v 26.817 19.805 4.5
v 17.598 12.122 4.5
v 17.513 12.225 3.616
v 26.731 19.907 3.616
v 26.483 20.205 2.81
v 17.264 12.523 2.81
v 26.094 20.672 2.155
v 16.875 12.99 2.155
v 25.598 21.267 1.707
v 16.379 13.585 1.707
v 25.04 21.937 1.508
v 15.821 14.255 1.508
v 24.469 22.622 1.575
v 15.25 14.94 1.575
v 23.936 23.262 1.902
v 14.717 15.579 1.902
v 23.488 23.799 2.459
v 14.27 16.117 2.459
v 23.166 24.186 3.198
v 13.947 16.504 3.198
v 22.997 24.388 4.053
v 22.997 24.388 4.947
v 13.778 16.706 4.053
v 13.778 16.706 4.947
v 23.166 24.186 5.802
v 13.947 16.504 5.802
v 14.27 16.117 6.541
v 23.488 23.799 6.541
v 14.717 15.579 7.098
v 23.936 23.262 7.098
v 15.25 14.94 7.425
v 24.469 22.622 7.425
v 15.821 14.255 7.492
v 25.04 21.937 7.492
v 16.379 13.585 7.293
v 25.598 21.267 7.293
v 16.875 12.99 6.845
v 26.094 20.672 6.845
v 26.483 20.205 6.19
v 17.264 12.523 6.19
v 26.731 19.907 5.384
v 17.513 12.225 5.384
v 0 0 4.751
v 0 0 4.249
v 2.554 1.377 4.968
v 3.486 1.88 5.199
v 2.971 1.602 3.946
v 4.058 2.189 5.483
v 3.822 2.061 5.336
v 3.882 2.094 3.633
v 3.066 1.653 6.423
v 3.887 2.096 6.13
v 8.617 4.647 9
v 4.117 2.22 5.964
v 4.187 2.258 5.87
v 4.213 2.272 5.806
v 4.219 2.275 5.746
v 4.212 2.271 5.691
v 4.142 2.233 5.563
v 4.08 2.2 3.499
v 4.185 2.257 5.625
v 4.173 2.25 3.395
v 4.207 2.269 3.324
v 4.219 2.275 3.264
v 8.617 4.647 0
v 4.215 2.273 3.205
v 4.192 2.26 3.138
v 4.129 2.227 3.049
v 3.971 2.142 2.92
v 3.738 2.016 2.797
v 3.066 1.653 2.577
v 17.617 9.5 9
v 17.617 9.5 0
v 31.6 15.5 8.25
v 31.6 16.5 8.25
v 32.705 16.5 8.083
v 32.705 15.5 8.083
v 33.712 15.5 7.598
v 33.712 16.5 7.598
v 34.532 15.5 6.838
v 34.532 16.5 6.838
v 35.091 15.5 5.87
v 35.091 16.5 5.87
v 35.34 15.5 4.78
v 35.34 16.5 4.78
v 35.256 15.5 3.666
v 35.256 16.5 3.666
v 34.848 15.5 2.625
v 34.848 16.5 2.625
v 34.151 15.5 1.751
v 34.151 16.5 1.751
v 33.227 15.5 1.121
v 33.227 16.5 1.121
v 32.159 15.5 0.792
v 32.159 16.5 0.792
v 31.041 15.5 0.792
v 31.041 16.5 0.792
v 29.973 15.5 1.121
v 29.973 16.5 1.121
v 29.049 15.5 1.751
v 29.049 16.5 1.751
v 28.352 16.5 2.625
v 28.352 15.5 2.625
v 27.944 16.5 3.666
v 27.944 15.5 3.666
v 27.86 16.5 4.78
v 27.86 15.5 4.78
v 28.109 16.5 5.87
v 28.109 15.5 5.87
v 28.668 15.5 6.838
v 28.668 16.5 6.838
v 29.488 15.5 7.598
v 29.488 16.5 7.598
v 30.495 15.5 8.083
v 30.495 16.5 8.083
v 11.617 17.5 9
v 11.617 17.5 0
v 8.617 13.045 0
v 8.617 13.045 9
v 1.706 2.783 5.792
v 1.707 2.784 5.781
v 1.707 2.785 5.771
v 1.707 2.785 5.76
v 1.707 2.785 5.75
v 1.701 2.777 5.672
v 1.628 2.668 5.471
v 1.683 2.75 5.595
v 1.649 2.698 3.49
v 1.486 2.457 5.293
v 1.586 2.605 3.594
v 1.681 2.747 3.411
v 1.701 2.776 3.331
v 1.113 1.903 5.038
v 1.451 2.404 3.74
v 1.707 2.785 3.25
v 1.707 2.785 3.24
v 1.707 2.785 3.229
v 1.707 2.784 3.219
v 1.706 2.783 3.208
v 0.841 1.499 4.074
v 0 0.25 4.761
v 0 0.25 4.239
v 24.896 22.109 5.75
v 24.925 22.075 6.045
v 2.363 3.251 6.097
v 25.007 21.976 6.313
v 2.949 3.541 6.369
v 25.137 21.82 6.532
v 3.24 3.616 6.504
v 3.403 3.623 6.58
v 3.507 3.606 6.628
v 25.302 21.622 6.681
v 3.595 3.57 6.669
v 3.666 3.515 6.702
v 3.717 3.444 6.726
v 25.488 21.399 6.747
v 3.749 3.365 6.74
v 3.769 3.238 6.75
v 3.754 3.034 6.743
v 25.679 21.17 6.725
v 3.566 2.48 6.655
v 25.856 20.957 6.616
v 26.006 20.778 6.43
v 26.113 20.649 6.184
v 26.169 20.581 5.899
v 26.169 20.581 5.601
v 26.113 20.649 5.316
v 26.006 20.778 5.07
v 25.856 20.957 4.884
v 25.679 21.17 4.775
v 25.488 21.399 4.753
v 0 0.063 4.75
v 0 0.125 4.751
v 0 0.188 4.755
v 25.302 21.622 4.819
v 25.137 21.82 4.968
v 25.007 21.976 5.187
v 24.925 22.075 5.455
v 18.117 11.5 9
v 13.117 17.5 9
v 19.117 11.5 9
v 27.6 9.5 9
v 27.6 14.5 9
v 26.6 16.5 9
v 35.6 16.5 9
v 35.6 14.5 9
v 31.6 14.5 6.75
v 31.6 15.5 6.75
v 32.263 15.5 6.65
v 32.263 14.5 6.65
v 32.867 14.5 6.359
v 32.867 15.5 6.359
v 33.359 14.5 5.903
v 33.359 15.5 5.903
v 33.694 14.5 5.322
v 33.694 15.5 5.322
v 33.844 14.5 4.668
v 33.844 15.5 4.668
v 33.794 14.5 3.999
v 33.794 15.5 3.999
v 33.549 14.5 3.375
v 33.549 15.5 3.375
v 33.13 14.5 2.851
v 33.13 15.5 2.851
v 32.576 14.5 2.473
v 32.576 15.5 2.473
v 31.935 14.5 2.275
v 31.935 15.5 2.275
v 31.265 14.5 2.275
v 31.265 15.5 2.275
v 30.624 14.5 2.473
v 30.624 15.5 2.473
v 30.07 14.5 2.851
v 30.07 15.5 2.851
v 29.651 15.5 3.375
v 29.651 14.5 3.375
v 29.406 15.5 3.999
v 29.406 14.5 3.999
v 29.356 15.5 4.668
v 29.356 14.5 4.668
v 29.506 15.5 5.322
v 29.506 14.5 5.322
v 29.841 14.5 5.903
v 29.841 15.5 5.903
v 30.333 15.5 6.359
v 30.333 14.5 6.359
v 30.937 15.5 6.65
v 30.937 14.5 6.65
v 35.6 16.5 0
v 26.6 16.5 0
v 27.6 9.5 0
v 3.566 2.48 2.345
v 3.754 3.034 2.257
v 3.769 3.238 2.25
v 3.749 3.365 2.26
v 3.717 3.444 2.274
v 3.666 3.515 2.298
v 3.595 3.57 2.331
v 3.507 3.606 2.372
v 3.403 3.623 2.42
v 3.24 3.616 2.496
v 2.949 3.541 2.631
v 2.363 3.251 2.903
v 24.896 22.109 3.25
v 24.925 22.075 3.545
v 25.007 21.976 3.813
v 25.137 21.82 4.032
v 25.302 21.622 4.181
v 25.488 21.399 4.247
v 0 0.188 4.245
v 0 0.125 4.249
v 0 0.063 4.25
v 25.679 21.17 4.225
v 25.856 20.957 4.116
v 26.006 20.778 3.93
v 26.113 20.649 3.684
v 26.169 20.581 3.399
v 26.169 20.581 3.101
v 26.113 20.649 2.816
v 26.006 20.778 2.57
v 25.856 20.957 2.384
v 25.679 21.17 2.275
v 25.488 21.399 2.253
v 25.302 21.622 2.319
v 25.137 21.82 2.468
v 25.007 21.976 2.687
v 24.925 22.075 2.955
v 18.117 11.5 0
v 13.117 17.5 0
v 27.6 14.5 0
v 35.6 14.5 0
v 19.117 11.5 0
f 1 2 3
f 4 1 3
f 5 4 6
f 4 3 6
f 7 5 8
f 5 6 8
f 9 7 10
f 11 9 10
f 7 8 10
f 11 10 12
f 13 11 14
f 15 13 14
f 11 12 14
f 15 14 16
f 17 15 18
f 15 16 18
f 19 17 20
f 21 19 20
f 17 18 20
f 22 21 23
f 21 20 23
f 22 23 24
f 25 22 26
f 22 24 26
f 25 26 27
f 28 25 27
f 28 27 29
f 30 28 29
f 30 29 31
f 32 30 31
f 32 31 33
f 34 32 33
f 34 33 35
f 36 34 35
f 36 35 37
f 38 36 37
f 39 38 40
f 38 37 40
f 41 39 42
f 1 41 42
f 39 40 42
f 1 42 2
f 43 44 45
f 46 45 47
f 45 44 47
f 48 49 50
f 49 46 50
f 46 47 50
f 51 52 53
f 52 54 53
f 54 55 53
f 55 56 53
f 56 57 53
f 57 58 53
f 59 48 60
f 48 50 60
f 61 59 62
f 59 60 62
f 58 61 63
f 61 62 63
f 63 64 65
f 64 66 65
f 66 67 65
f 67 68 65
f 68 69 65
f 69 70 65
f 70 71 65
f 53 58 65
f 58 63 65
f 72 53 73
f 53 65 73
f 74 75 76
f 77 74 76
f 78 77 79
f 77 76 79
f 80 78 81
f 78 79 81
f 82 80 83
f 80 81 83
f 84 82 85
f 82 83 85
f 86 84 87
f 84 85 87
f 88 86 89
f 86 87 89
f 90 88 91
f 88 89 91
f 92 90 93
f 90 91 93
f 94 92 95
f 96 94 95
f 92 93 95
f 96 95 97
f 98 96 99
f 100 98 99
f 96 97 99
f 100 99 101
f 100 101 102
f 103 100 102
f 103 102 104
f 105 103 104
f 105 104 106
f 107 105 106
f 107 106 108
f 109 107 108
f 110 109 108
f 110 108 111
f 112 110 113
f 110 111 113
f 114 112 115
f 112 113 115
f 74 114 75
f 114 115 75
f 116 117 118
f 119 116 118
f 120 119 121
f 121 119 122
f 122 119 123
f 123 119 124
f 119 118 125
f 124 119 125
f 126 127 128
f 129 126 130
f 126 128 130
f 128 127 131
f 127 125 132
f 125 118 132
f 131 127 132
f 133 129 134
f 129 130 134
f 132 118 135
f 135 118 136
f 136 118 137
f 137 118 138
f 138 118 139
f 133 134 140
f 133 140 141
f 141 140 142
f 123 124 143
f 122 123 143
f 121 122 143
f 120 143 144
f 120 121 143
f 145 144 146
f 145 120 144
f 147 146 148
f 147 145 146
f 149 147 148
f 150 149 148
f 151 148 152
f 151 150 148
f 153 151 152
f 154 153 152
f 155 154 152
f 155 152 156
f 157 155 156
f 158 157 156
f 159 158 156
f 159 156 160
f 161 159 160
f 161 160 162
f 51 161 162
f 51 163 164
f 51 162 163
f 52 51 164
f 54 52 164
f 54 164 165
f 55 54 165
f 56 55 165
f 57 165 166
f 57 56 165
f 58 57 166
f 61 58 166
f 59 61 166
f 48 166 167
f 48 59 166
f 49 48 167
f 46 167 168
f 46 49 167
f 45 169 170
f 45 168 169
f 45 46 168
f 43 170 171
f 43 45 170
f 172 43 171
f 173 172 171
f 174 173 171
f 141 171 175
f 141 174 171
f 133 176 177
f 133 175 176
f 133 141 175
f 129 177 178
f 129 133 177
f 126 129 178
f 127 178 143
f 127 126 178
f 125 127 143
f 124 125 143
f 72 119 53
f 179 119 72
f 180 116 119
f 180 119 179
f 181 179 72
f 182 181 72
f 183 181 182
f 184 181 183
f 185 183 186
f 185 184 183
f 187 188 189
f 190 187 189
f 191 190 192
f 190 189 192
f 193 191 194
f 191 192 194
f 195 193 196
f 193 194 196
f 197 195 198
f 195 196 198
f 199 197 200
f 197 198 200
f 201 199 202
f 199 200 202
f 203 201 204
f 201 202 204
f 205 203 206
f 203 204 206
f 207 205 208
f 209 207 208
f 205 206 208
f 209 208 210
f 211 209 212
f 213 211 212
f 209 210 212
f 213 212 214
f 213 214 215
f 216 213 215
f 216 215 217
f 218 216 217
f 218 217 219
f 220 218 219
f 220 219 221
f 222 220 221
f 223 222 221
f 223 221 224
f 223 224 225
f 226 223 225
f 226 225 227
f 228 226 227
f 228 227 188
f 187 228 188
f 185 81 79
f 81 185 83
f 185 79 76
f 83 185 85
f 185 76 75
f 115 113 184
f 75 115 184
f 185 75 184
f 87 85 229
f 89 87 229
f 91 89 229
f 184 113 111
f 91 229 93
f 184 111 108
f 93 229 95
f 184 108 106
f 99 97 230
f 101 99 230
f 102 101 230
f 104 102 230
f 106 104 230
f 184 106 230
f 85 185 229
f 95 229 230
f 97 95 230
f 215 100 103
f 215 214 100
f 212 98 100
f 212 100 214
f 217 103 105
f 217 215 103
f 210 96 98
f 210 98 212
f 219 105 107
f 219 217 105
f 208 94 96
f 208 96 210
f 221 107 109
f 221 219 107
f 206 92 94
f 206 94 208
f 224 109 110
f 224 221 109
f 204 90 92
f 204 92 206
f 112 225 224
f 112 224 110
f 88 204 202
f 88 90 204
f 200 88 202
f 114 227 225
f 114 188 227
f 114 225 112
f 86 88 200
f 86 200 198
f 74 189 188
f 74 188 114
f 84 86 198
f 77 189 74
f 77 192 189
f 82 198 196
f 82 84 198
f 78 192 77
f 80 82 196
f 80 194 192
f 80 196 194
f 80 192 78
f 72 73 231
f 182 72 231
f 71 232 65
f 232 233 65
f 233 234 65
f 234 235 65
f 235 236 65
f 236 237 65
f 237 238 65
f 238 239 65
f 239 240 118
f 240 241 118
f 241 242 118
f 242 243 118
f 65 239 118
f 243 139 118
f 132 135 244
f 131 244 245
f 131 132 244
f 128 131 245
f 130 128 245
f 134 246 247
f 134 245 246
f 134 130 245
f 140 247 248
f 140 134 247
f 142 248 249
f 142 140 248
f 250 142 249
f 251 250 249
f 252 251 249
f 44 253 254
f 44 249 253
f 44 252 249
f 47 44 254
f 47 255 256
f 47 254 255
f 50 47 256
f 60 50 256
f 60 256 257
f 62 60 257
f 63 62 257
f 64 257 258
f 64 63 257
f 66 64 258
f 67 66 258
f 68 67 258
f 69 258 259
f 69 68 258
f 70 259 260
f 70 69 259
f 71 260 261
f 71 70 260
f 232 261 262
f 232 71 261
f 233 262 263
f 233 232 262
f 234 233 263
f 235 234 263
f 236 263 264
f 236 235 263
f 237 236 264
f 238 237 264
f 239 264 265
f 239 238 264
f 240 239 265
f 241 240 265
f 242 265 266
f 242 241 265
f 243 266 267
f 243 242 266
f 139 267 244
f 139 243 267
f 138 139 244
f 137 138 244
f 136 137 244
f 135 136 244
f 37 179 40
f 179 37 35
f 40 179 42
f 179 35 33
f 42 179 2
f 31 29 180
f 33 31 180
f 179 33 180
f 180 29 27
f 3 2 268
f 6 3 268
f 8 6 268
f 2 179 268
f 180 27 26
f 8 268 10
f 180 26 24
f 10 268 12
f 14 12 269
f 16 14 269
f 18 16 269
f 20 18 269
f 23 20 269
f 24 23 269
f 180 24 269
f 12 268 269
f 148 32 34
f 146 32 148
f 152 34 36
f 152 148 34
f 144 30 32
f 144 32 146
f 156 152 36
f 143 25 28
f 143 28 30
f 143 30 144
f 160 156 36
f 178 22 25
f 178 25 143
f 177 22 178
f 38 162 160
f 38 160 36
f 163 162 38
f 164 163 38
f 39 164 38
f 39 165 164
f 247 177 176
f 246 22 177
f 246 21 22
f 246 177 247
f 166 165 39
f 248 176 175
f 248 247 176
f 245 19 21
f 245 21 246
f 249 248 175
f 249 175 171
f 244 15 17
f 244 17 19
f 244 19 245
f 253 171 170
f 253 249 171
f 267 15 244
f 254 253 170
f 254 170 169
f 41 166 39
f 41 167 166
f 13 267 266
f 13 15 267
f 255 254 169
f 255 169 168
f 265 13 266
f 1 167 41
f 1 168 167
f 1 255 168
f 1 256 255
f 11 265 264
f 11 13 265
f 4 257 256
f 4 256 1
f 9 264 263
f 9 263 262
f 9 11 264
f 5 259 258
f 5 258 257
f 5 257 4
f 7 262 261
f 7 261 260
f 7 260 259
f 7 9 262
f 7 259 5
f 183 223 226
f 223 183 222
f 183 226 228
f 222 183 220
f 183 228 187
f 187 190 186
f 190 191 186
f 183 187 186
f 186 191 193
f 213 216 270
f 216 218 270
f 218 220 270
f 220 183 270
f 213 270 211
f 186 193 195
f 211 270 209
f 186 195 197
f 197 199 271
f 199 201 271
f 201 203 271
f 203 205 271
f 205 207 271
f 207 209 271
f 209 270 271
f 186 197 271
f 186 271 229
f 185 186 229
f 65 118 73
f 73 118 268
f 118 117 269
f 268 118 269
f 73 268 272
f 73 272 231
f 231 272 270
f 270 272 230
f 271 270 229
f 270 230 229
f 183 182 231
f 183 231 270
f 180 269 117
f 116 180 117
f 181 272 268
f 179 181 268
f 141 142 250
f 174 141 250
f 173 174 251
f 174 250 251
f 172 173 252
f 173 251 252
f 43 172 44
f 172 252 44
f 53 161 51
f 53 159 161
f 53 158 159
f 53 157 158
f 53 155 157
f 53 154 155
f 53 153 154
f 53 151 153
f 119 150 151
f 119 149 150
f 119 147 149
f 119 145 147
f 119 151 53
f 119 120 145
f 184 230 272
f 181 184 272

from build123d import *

# Parameters (mm, degrees)
BOSS_EXTRUDE1_DEPTH     = 9
SKETCH2_R               = 2.25
CUT_EXTRUDE1_DEPTH      = 16.5
SKETCH2_3_R             = 3.75
SKETCH2_3_R_2           = 2.25
CUT_EXTRUDE2_DEPTH      = 1
SKETCH3_R               = 3
BOSS_EXTRUDE2_DEPTH     = 12
CUT_EXTRUDE3_DEPTH      = 26.24364859
CUT_EXTRUDE3_DEPTH_BACK = 26.24364859
SKETCH4_R               = 1


with BuildPart() as part:
    # Sketch1 → Boss-Extrude1 (new body)
    with BuildSketch(Plane.XY):
        Polygon((0, 0), (17.616685226, 9.5), (27.6, 9.5), (27.6, 14.5), (35.6, 14.5), (35.6, 16.5), (26.6, 16.5), (19.116685226, 11.5), (18.116685226, 11.5), (13.116685226, 17.5), (11.616685226, 17.5), (0, 0.25), align=None)
    extrude(amount=BOSS_EXTRUDE1_DEPTH)

    # Sketch2 → Cut-Extrude1 (cut)
    with BuildSketch(Plane(origin=(0, 16.5, 0), x_dir=(1, 0, 0), z_dir=(0, 1, 0))):
        with Locations(Location((31.6, -4.5, 0), (0, 0, 270))):
            Circle(SKETCH2_R)
        Polygon((0, 0), (0, -4), (8.616685226, 0), align=None)
        Polygon((0, -5), (8.616685226, -9), (0, -9), align=None)
    extrude(amount=-CUT_EXTRUDE1_DEPTH, mode=Mode.SUBTRACT)

    # Sketch2<3> → Cut-Extrude2 (cut)
    with BuildSketch(Plane(origin=(0, 16.5, 0), x_dir=(1, 0, 0), z_dir=(0, 1, 0))):
        with Locations(Location((31.6, -4.5, 0), (0, 0, 270))):
            Circle(SKETCH2_3_R)
        with Locations(Location((31.6, -4.5, 0), (0, 0, 270))):
            Circle(SKETCH2_3_R_2, mode=Mode.SUBTRACT)
    extrude(amount=-CUT_EXTRUDE2_DEPTH, mode=Mode.SUBTRACT)

    # Sketch3 → Boss-Extrude2 (add)
    with BuildSketch(Plane(origin=(16.347551937, 13.622959947, 0), x_dir=(0, 0, -1), z_dir=(0.768221279597376, 0.6401843996644799, 0))):
        with Locations(Location((-4.5, 1.046775136, 0), (0, 0, 270))):
            Circle(SKETCH3_R)
    extrude(amount=BOSS_EXTRUDE2_DEPTH)

    # Sketch4 → Cut-Extrude3 (cut, two sides: drawn at the far end of the back side and taken through both)
    with BuildSketch(Plane(origin=(16.347551937, 13.622959947, 0), x_dir=(0, 0, -1), z_dir=(0.768221279597376, 0.6401843996644799, 0)).offset(-CUT_EXTRUDE3_DEPTH_BACK)):
        with Locations(Location((-5.75, 0.046775136, 0), (0, 0, 90))):
            Circle(SKETCH4_R)
        with Locations(Location((-3.25, 0.046775136, 0), (0, 0, 90))):
            Circle(SKETCH4_R)
    extrude(amount=CUT_EXTRUDE3_DEPTH + CUT_EXTRUDE3_DEPTH_BACK, mode=Mode.SUBTRACT)


solid = part.part
